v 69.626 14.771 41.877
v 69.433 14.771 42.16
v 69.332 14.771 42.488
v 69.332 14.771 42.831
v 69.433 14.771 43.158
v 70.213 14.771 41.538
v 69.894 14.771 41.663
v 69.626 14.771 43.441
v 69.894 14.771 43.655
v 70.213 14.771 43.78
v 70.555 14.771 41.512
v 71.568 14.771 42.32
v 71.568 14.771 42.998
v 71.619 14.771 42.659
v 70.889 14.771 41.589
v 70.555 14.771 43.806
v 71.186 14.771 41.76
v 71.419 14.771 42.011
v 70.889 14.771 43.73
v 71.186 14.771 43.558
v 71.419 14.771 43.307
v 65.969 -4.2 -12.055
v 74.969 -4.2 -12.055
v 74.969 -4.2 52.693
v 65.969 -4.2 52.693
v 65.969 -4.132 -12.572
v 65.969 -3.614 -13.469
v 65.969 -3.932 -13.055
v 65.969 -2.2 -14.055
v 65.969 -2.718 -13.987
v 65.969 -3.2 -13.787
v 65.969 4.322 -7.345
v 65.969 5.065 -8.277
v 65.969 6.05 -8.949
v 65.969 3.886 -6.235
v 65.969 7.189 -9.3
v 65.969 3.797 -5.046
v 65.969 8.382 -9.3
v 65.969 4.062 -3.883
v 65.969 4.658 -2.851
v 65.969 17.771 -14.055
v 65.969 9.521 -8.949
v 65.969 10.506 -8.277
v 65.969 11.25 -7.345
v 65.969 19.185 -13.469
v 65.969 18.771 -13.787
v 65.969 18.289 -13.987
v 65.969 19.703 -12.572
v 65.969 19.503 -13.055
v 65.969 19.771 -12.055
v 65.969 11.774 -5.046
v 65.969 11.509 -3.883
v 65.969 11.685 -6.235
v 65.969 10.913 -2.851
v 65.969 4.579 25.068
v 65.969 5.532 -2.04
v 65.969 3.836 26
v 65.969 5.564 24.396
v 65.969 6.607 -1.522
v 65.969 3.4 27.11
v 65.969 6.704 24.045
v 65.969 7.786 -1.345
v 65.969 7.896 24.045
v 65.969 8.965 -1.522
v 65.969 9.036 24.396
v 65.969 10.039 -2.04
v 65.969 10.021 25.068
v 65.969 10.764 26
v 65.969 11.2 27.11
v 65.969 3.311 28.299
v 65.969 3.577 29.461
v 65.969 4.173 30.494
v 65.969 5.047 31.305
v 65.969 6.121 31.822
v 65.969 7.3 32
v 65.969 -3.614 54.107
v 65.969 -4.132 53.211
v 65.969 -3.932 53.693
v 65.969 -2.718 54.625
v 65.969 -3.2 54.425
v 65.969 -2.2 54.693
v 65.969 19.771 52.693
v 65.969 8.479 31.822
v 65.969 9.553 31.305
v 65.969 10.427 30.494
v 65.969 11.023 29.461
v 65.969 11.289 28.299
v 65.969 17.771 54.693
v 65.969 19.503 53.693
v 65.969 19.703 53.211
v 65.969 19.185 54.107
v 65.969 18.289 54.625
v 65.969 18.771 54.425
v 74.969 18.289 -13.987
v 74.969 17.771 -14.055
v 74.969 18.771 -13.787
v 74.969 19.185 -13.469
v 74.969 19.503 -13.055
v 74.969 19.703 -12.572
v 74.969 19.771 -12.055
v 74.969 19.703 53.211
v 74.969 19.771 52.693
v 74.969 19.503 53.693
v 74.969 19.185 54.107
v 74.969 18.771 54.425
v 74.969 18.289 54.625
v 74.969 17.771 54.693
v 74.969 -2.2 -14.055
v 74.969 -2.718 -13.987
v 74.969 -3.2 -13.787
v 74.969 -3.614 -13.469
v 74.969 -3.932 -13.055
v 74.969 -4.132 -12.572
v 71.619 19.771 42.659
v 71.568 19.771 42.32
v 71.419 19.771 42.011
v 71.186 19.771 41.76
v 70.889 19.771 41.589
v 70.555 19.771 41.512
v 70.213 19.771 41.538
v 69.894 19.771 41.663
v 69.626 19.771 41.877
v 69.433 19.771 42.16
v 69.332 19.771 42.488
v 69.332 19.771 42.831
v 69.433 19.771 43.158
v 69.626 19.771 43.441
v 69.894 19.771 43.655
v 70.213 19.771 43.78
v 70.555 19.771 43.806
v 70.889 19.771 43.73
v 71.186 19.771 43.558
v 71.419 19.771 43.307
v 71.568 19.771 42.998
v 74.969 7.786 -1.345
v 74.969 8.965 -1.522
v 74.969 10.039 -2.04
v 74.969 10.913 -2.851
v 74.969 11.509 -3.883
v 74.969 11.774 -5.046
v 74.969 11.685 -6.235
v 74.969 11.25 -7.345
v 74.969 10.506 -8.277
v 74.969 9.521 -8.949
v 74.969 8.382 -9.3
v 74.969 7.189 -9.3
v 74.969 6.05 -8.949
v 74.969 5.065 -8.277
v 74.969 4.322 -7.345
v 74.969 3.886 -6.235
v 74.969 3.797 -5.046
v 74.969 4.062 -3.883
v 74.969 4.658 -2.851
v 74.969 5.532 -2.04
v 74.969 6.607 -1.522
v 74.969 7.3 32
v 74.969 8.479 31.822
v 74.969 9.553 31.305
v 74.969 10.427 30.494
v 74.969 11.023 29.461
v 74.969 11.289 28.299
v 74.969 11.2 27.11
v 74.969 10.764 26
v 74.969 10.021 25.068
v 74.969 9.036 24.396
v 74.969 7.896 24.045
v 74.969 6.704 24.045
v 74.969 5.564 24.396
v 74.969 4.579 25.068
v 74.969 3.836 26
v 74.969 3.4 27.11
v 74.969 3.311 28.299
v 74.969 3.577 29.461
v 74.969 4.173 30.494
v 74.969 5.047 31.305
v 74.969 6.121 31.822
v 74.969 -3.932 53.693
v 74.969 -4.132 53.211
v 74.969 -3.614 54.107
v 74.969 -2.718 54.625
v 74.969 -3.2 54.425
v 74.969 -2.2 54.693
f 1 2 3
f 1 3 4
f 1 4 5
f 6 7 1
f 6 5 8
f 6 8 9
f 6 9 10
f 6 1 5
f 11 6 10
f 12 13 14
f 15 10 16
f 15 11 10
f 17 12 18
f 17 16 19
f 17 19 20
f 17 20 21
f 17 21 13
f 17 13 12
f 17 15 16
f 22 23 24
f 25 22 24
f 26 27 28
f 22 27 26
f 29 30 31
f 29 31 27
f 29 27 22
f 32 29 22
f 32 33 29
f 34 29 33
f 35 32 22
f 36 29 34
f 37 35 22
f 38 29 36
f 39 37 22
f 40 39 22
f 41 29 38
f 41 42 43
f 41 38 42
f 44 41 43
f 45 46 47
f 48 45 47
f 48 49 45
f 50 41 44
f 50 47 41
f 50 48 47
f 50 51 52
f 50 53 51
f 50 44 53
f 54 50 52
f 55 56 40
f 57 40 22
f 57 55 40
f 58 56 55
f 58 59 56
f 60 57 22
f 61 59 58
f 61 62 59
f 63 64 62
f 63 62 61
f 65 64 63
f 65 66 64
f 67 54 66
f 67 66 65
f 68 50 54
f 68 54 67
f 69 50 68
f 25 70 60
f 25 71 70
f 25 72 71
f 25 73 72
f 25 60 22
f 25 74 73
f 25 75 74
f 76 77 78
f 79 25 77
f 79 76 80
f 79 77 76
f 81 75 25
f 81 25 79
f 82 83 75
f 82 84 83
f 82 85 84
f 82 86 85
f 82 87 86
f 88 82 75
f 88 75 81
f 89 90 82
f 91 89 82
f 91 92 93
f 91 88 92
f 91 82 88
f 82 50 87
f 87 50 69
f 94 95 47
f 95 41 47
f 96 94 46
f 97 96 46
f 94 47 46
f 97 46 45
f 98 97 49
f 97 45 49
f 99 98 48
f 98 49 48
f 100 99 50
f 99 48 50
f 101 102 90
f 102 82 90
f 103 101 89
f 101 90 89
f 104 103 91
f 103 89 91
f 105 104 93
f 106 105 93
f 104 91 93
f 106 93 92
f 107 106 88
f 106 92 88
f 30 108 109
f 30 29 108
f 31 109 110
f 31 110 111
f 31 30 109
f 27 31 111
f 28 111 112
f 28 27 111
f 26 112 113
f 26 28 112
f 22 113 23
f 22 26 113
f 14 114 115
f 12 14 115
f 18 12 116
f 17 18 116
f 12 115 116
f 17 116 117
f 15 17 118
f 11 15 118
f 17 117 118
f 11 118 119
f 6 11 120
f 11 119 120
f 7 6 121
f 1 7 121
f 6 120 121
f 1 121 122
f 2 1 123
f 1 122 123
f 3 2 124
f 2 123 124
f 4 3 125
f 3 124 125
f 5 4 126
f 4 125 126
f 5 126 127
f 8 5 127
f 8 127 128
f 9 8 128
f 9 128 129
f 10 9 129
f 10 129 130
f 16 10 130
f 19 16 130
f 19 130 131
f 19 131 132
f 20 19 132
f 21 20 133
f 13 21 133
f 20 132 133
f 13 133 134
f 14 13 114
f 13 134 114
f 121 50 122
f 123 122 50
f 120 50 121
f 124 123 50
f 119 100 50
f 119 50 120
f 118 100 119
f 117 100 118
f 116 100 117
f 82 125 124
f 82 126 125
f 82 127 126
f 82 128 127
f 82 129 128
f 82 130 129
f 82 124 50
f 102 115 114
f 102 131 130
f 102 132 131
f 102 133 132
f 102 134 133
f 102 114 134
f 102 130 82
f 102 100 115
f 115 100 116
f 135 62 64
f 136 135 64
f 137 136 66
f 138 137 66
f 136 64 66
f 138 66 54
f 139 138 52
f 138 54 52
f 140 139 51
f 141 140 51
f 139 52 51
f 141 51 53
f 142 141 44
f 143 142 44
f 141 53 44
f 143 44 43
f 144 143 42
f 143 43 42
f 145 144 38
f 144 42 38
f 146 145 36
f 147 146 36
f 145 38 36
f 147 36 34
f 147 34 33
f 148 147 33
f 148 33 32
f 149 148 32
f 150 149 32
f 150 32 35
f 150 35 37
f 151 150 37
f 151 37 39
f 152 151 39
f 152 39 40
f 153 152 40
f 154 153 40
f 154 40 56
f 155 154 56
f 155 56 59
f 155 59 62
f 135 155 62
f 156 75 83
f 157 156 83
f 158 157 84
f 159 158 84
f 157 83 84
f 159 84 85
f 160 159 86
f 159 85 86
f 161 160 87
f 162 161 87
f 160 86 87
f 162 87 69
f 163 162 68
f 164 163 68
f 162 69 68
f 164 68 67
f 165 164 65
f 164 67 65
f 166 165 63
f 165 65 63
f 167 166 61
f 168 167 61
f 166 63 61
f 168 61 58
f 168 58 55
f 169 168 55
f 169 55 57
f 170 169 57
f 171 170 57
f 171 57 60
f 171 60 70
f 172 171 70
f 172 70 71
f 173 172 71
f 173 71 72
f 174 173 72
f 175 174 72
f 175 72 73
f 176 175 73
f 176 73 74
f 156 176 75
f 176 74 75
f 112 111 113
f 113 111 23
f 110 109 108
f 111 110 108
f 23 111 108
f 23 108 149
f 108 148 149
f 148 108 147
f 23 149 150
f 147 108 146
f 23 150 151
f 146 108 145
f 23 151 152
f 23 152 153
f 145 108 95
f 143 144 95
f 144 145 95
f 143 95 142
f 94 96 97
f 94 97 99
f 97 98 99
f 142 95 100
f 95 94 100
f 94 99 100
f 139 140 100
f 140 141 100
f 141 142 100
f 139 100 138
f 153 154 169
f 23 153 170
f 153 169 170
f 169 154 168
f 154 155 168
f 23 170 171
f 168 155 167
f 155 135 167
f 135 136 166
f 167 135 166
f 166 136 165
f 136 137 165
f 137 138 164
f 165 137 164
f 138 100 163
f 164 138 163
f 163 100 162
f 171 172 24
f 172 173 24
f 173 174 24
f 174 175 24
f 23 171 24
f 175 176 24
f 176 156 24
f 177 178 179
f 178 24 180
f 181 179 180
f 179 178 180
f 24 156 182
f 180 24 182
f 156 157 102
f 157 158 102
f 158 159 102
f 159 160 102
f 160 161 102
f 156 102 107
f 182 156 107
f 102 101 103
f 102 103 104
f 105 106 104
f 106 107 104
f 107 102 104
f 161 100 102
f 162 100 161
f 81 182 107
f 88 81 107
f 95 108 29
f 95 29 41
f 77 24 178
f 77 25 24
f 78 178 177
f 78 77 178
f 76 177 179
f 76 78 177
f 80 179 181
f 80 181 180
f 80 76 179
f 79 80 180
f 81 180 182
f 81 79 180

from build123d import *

# Parameters (mm, degrees)
SKETCH1_W           = 68.747968374
SKETCH1_H           = 23.971240905
BOSS_EXTRUDE1_DEPTH = 9
SKETCH2_R           = 4
CUT_EXTRUDE1_DEPTH  = 9
FILLET1_R           = 2
SKETCH3_R           = 1.15
CUT_EXTRUDE2_DEPTH  = 5
CUT_EXTRUDE3_REACH  = 11
SKETCH4_R           = 4


with BuildPart() as part:
    # Sketch1 → Boss-Extrude1 (new body)
    with BuildSketch(Plane.ZY.offset(-74.969208633)):
        with Locations((20.319218255, 7.785620453)):
            Rectangle(SKETCH1_W, SKETCH1_H)
    extrude(amount=BOSS_EXTRUDE1_DEPTH)

    # Sketch2 → Cut-Extrude1 (cut)
    with BuildSketch(Plane.ZY.offset(-65.969208633)):
        with Locations((28, 7.3)):
            Circle(SKETCH2_R)
    extrude(amount=-CUT_EXTRUDE1_DEPTH, mode=Mode.SUBTRACT)

    # Fillet1
    fillet1_edges = [part.edges().sort_by_distance(p)[0] for p in [
        (70.469208633, 19.771240905, -14.054765932),
        (70.469208633, 19.771240905, 54.693202442),
        (70.469208633, -4.2, 54.693202442),
        (70.469208633, -4.2, -14.054765932),
    ]]
    fillet(fillet1_edges, radius=FILLET1_R)

    # Sketch3 → Cut-Extrude2 (cut)
    with BuildSketch(Plane(origin=(0, 19.771240905, 0), x_dir=(1, 0, 0), z_dir=(0, 1, 0))):
        with Locations((70.469208633, -42.659277992)):
            Circle(SKETCH3_R)
    extrude(amount=-CUT_EXTRUDE2_DEPTH, mode=Mode.SUBTRACT)

    # Sketch4 → Cut-Extrude3 (cut, up to next)
    with BuildSketch(Plane.ZY.offset(-65.969208633), mode=Mode.PRIVATE) as cut_extrude3_sk1:
        with Locations((-5.344766421, 7.785620452)):
            Circle(SKETCH4_R)
    cut_extrude3_tool1 = extrude(cut_extrude3_sk1.sketch, amount=-CUT_EXTRUDE3_REACH, mode=Mode.PRIVATE) & part.part
    add(cut_extrude3_tool1.solids().sort_by_distance((65.969209, 7.78562, -5.344766))[0], mode=Mode.SUBTRACT)


solid = part.part
